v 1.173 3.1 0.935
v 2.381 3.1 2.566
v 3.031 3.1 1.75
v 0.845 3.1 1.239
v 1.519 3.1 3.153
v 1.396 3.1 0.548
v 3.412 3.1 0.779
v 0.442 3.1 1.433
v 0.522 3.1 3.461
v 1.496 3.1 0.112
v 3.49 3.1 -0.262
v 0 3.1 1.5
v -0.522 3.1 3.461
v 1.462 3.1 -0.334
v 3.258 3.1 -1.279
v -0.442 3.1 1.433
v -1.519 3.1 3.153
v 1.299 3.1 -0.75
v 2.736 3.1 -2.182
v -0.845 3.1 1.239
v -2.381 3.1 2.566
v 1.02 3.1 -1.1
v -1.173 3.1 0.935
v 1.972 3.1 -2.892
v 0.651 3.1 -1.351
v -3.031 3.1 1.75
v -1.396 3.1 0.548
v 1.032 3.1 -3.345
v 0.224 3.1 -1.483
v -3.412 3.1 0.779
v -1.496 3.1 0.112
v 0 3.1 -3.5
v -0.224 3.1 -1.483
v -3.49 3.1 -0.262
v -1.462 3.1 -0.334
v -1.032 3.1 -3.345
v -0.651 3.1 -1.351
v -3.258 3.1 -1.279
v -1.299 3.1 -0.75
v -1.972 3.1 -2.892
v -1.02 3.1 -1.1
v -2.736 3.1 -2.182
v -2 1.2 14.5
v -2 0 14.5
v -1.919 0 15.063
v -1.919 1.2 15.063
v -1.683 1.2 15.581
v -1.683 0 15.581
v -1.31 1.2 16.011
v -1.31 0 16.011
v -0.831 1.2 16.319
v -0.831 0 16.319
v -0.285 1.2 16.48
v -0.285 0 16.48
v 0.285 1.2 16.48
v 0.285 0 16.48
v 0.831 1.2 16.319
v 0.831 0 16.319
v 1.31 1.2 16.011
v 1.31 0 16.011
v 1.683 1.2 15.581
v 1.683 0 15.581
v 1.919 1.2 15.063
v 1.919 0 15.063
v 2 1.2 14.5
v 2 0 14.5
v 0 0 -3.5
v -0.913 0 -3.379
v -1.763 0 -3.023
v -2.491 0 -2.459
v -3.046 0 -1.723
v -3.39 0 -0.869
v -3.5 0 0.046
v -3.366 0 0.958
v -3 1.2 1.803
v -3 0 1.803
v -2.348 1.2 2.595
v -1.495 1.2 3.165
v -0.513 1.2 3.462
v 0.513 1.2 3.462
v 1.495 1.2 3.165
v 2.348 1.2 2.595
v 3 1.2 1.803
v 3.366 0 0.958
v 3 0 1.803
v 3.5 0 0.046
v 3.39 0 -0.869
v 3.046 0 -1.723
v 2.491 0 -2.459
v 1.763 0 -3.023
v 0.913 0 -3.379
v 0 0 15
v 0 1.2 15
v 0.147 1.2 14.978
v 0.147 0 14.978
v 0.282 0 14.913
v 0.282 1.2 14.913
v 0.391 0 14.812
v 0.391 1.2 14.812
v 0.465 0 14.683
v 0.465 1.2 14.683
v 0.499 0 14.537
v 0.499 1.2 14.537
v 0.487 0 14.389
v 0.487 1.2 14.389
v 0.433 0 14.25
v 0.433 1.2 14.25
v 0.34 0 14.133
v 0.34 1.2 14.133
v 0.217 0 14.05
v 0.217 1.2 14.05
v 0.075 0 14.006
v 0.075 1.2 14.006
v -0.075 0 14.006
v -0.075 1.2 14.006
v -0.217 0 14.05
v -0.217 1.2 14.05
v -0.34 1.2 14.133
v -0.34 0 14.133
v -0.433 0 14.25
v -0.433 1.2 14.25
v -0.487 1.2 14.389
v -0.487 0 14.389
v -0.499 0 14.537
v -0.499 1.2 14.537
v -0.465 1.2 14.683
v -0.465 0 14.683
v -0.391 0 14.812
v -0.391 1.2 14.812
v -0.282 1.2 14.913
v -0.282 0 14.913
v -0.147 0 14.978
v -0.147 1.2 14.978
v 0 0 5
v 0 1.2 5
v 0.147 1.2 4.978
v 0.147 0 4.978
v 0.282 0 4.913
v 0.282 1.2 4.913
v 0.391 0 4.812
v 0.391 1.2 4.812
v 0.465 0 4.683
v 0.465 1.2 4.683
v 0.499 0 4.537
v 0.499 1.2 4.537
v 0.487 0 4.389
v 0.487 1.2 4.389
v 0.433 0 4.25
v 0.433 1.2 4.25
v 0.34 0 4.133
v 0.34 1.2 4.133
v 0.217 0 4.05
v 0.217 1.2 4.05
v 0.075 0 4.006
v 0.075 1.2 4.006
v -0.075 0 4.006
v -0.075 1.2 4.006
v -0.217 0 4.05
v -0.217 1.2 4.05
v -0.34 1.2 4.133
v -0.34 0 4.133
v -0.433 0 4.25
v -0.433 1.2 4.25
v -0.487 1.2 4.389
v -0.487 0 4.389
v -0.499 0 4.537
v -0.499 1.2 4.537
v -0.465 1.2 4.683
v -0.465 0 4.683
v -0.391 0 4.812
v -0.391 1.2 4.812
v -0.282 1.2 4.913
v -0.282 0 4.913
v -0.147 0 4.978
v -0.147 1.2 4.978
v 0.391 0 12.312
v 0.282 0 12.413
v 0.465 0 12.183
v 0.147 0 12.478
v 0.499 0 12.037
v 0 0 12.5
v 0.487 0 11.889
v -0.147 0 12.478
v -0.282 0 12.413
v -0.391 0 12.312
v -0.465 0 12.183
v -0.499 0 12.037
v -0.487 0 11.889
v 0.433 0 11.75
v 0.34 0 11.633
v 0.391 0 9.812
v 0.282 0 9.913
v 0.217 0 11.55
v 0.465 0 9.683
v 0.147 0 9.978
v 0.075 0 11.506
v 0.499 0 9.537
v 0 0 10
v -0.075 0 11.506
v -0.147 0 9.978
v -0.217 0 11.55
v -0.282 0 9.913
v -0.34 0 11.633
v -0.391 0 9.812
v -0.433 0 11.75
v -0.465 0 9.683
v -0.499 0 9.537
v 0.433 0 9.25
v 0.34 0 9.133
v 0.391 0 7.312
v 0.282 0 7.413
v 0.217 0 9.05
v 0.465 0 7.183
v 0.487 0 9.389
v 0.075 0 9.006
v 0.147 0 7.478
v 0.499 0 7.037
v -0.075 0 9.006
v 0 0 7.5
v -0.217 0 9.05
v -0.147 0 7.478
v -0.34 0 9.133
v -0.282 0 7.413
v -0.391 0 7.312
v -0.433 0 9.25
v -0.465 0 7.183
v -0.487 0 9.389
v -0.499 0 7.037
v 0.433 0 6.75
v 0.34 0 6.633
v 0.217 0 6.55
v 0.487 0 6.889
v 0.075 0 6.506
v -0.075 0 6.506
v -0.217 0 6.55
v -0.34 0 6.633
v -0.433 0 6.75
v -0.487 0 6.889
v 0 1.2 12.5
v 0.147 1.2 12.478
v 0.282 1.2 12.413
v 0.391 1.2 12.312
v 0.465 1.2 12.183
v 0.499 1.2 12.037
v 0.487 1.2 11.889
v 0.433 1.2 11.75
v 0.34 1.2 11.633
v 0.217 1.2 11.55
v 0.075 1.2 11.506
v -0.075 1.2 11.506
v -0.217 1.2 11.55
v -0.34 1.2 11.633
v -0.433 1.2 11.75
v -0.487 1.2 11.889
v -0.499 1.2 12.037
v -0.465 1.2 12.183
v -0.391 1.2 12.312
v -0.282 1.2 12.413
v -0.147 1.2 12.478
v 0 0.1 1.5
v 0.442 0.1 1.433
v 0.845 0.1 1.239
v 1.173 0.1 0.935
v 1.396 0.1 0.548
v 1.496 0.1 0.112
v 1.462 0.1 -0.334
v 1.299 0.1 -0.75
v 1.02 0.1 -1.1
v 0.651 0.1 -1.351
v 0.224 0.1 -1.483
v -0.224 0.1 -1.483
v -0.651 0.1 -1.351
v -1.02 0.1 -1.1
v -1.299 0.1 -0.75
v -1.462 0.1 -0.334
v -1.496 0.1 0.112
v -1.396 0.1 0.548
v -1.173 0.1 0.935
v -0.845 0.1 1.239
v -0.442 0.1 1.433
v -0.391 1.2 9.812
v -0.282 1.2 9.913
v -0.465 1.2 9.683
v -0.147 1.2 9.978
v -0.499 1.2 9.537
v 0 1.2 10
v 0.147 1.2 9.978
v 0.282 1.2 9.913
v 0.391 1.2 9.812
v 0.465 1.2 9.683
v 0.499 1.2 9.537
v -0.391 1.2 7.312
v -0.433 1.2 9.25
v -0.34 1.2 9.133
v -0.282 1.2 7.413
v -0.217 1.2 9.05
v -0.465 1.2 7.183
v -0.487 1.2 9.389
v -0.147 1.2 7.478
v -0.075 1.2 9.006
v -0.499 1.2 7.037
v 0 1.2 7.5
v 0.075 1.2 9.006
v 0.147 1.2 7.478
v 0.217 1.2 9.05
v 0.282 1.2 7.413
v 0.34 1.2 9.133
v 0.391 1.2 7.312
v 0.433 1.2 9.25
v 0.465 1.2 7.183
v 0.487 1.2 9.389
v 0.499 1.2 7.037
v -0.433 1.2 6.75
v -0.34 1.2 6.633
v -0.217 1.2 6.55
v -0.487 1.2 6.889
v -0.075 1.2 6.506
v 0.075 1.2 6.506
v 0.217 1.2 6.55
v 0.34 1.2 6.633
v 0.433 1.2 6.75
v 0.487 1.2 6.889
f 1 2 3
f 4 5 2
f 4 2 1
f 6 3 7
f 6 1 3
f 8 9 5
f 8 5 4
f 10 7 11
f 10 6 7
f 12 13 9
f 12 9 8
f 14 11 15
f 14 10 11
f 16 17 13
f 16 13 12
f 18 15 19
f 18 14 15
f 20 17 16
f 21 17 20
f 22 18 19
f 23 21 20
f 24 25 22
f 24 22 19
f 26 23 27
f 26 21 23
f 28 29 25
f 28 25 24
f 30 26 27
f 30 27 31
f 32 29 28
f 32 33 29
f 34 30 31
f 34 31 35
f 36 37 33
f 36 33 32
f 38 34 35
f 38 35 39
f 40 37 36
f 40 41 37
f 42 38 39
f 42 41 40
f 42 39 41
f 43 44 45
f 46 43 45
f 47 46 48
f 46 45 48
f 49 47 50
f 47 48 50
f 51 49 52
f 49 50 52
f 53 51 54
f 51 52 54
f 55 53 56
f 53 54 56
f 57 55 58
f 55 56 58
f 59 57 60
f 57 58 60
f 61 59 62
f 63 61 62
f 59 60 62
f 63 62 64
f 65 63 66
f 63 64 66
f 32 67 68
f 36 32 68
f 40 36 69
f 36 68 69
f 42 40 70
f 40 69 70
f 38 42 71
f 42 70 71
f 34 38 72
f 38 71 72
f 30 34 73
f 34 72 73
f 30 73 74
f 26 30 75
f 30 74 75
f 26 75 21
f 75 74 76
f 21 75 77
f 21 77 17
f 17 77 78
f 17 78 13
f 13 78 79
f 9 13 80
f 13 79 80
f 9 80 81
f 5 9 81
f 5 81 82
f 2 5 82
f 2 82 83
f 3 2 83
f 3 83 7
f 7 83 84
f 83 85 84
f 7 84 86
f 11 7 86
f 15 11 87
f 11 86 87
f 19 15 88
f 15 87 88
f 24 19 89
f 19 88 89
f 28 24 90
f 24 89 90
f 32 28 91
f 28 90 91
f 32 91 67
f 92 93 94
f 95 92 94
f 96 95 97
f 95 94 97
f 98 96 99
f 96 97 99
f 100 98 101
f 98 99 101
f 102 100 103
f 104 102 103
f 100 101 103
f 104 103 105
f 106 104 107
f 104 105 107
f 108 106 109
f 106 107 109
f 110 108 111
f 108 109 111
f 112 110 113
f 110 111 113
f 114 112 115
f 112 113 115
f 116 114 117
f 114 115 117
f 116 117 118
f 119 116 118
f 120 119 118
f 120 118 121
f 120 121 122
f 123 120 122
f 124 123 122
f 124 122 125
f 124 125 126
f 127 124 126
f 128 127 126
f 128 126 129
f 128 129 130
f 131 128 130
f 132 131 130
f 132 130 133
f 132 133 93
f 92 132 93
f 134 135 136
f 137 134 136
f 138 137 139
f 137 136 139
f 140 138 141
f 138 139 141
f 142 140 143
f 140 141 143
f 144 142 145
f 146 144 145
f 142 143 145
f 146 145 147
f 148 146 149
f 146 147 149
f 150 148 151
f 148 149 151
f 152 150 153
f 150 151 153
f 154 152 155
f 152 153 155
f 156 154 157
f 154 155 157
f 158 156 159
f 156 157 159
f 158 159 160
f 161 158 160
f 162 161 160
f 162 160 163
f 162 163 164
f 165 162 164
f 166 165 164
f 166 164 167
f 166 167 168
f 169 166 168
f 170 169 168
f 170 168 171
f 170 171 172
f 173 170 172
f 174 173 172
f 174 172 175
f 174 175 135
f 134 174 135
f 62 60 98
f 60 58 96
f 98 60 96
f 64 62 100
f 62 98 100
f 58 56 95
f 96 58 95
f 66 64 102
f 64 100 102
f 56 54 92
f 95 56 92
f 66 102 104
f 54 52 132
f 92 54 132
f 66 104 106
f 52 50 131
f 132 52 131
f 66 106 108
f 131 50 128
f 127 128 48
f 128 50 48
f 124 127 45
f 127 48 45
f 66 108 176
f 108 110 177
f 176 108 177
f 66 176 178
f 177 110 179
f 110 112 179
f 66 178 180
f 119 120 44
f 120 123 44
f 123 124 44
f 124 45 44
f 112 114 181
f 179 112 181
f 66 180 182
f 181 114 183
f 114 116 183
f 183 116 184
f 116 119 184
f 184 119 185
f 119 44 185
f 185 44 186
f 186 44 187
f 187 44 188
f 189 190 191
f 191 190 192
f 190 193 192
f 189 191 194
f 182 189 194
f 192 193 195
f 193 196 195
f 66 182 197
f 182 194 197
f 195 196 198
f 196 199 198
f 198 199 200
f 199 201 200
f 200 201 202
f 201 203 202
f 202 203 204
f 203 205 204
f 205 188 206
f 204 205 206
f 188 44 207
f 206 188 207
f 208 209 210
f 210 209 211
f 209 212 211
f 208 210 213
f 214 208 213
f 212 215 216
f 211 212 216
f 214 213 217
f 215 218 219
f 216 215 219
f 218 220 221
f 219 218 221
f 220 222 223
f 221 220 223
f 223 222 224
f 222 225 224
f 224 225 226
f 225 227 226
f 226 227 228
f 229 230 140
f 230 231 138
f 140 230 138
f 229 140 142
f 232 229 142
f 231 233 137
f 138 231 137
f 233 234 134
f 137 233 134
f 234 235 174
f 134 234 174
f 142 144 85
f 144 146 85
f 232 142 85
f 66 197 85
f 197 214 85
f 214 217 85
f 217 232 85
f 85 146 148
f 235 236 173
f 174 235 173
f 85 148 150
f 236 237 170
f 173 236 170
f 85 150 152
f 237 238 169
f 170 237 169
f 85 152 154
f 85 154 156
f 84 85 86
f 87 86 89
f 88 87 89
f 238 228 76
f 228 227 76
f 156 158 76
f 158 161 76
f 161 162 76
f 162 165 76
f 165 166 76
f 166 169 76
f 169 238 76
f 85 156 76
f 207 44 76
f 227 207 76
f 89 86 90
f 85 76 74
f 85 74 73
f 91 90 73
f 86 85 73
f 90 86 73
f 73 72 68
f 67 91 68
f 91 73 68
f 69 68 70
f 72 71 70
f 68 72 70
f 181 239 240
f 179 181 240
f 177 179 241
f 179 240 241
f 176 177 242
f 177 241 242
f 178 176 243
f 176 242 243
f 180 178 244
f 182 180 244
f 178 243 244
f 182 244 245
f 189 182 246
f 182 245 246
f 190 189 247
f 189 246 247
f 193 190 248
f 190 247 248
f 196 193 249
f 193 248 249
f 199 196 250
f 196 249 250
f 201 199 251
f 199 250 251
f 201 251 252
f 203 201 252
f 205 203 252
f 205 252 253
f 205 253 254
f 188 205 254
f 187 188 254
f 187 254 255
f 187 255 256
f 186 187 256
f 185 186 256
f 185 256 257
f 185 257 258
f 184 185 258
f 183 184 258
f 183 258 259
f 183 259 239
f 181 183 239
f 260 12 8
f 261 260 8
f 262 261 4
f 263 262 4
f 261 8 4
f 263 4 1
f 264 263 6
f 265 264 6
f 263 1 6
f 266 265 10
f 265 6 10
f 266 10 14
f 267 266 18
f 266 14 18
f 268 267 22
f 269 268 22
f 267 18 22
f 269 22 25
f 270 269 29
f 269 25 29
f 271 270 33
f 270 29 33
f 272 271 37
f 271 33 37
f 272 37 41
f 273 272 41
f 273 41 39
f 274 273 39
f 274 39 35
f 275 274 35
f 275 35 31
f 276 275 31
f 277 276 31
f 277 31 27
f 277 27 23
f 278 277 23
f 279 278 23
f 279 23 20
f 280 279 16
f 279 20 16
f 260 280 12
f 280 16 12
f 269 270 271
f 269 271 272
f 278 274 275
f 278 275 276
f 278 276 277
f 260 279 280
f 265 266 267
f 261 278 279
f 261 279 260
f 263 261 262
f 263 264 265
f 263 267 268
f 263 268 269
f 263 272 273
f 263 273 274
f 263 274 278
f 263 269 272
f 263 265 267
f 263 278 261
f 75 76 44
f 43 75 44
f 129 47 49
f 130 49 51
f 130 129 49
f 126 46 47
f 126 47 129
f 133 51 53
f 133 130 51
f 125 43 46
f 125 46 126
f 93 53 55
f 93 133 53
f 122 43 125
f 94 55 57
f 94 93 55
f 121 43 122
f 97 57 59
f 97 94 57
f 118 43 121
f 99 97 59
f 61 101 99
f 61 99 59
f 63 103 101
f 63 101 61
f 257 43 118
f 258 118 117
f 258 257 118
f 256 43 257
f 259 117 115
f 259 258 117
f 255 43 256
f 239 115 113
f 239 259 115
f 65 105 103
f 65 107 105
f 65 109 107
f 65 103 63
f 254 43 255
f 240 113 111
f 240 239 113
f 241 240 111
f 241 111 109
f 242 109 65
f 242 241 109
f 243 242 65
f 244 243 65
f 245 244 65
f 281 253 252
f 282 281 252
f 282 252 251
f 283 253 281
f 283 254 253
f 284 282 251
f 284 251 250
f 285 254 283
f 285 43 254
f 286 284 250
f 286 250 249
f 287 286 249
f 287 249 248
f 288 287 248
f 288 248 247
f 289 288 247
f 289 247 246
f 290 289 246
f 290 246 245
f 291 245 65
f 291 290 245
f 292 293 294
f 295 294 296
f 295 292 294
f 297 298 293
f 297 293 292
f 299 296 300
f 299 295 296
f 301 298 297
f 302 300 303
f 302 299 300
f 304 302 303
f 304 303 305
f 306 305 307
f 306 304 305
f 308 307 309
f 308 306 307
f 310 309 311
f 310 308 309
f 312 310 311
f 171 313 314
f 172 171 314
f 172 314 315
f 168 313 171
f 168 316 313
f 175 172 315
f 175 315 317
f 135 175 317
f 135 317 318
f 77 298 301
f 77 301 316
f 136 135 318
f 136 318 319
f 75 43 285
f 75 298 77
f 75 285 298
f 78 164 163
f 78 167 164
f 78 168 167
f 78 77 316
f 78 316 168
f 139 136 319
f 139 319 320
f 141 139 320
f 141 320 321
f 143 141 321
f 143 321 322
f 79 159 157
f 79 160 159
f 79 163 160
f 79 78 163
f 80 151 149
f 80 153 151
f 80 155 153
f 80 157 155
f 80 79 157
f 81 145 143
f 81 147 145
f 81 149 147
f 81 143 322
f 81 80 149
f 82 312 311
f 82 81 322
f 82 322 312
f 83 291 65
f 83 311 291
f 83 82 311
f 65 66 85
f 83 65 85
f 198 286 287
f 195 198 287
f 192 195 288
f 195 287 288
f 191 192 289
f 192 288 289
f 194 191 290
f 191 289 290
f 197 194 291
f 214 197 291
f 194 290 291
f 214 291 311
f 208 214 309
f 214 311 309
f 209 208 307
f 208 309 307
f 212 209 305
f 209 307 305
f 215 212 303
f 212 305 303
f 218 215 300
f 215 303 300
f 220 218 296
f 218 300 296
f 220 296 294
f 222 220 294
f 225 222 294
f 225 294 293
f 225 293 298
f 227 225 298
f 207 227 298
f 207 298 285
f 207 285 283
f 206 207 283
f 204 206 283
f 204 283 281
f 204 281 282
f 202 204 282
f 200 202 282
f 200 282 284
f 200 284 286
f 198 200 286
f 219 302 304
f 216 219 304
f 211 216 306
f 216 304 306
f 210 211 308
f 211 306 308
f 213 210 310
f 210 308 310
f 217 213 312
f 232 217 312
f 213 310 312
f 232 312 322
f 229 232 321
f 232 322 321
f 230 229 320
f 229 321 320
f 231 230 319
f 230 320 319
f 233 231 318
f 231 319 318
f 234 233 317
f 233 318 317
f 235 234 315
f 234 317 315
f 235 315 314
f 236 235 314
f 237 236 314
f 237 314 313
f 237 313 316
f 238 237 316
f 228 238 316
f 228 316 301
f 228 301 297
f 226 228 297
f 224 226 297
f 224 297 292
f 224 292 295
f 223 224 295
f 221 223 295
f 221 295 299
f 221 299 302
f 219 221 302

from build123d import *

# Parameters (mm, degrees)
SKETCH_1_R          = 3.5
EXTRUDE_1_DEPTH     = 3.1
EXTRUDE_2_DEPTH     = 1.2
SKETCH_3_R          = 1.5
CUT_EXTRUDE_1_DEPTH = 3
CUT_EXTRUDE_2_REACH = 18.974
SKETCH_4_R          = 0.5


with BuildPart() as part:
    # 草图1 → 凸台-拉伸1 (new body)
    with BuildSketch(Plane(origin=(0, 0, 0), x_dir=(1, 0, 0), z_dir=(0, 1, 0))):
        Circle(SKETCH_1_R)
    extrude(amount=EXTRUDE_1_DEPTH)

    # 草图2 → 凸台-拉伸2 (add)
    with BuildSketch(Plane(origin=(0, 0, 0), x_dir=(1, 0, 0), z_dir=(0, 1, 0))):
        with BuildLine():
            Line((-3, -1.802775638), (-2, -14.5))
            ThreePointArc((-2, -14.5), (0, -16.5), (2, -14.5))
            Line((2, -14.5), (3, -1.802775638))
            ThreePointArc((3, -1.802775638), (0, -3.5), (-3, -1.802775638))
        make_face()
    extrude(amount=EXTRUDE_2_DEPTH)

    # 草图3 → 切除-拉伸1 (cut)
    with BuildSketch(Plane(origin=(0, 3.1, 0), x_dir=(1, 0, 0), z_dir=(0, 1, 0))):
        Circle(SKETCH_3_R)
    extrude(amount=-CUT_EXTRUDE_1_DEPTH, mode=Mode.SUBTRACT)

    # 草图4 → 切除-拉伸2 (cut, up to next)
    with BuildSketch(Plane(origin=(0, 1.2, 0), x_dir=(1, 0, 0), z_dir=(0, 1, 0)), mode=Mode.PRIVATE) as cut_extrude_2_sk1:
        with Locations((0, -14.5)):
            Circle(SKETCH_4_R)
    cut_extrude_2_tool1 = extrude(cut_extrude_2_sk1.sketch, amount=-CUT_EXTRUDE_2_REACH, mode=Mode.PRIVATE) & part.part
    # 草图4 → 切除-拉伸2 (cut, up to next)
    with BuildSketch(Plane(origin=(0, 1.2, 0), x_dir=(1, 0, 0), z_dir=(0, 1, 0)), mode=Mode.PRIVATE) as cut_extrude_2_sk2:
        with Locations((0, -12)):
            Circle(SKETCH_4_R)
    cut_extrude_2_tool2 = extrude(cut_extrude_2_sk2.sketch, amount=-CUT_EXTRUDE_2_REACH, mode=Mode.PRIVATE) & part.part
    # 草图4 → 切除-拉伸2 (cut, up to next)
    with BuildSketch(Plane(origin=(0, 1.2, 0), x_dir=(1, 0, 0), z_dir=(0, 1, 0)), mode=Mode.PRIVATE) as cut_extrude_2_sk3:
        with Locations((0, -9.5)):
            Circle(SKETCH_4_R)
    cut_extrude_2_tool3 = extrude(cut_extrude_2_sk3.sketch, amount=-CUT_EXTRUDE_2_REACH, mode=Mode.PRIVATE) & part.part
    # 草图4 → 切除-拉伸2 (cut, up to next)
    with BuildSketch(Plane(origin=(0, 1.2, 0), x_dir=(1, 0, 0), z_dir=(0, 1, 0)), mode=Mode.PRIVATE) as cut_extrude_2_sk4:
        with Locations((0, -7)):
            Circle(SKETCH_4_R)
    cut_extrude_2_tool4 = extrude(cut_extrude_2_sk4.sketch, amount=-CUT_EXTRUDE_2_REACH, mode=Mode.PRIVATE) & part.part
    # 草图4 → 切除-拉伸2 (cut, up to next)
    with BuildSketch(Plane(origin=(0, 1.2, 0), x_dir=(1, 0, 0), z_dir=(0, 1, 0)), mode=Mode.PRIVATE) as cut_extrude_2_sk5:
        with Locations((0, -4.5)):
            Circle(SKETCH_4_R)
    cut_extrude_2_tool5 = extrude(cut_extrude_2_sk5.sketch, amount=-CUT_EXTRUDE_2_REACH, mode=Mode.PRIVATE) & part.part
    add(cut_extrude_2_tool1.solids().sort_by_distance((0, 1.2, 14.5))[0], mode=Mode.SUBTRACT)
    add(cut_extrude_2_tool2.solids().sort_by_distance((0, 1.2, 12))[0], mode=Mode.SUBTRACT)
    add(cut_extrude_2_tool3.solids().sort_by_distance((0, 1.2, 9.5))[0], mode=Mode.SUBTRACT)
    add(cut_extrude_2_tool4.solids().sort_by_distance((0, 1.2, 7))[0], mode=Mode.SUBTRACT)
    add(cut_extrude_2_tool5.solids().sort_by_distance((0, 1.2, 4.5))[0], mode=Mode.SUBTRACT)


solid = part.part
